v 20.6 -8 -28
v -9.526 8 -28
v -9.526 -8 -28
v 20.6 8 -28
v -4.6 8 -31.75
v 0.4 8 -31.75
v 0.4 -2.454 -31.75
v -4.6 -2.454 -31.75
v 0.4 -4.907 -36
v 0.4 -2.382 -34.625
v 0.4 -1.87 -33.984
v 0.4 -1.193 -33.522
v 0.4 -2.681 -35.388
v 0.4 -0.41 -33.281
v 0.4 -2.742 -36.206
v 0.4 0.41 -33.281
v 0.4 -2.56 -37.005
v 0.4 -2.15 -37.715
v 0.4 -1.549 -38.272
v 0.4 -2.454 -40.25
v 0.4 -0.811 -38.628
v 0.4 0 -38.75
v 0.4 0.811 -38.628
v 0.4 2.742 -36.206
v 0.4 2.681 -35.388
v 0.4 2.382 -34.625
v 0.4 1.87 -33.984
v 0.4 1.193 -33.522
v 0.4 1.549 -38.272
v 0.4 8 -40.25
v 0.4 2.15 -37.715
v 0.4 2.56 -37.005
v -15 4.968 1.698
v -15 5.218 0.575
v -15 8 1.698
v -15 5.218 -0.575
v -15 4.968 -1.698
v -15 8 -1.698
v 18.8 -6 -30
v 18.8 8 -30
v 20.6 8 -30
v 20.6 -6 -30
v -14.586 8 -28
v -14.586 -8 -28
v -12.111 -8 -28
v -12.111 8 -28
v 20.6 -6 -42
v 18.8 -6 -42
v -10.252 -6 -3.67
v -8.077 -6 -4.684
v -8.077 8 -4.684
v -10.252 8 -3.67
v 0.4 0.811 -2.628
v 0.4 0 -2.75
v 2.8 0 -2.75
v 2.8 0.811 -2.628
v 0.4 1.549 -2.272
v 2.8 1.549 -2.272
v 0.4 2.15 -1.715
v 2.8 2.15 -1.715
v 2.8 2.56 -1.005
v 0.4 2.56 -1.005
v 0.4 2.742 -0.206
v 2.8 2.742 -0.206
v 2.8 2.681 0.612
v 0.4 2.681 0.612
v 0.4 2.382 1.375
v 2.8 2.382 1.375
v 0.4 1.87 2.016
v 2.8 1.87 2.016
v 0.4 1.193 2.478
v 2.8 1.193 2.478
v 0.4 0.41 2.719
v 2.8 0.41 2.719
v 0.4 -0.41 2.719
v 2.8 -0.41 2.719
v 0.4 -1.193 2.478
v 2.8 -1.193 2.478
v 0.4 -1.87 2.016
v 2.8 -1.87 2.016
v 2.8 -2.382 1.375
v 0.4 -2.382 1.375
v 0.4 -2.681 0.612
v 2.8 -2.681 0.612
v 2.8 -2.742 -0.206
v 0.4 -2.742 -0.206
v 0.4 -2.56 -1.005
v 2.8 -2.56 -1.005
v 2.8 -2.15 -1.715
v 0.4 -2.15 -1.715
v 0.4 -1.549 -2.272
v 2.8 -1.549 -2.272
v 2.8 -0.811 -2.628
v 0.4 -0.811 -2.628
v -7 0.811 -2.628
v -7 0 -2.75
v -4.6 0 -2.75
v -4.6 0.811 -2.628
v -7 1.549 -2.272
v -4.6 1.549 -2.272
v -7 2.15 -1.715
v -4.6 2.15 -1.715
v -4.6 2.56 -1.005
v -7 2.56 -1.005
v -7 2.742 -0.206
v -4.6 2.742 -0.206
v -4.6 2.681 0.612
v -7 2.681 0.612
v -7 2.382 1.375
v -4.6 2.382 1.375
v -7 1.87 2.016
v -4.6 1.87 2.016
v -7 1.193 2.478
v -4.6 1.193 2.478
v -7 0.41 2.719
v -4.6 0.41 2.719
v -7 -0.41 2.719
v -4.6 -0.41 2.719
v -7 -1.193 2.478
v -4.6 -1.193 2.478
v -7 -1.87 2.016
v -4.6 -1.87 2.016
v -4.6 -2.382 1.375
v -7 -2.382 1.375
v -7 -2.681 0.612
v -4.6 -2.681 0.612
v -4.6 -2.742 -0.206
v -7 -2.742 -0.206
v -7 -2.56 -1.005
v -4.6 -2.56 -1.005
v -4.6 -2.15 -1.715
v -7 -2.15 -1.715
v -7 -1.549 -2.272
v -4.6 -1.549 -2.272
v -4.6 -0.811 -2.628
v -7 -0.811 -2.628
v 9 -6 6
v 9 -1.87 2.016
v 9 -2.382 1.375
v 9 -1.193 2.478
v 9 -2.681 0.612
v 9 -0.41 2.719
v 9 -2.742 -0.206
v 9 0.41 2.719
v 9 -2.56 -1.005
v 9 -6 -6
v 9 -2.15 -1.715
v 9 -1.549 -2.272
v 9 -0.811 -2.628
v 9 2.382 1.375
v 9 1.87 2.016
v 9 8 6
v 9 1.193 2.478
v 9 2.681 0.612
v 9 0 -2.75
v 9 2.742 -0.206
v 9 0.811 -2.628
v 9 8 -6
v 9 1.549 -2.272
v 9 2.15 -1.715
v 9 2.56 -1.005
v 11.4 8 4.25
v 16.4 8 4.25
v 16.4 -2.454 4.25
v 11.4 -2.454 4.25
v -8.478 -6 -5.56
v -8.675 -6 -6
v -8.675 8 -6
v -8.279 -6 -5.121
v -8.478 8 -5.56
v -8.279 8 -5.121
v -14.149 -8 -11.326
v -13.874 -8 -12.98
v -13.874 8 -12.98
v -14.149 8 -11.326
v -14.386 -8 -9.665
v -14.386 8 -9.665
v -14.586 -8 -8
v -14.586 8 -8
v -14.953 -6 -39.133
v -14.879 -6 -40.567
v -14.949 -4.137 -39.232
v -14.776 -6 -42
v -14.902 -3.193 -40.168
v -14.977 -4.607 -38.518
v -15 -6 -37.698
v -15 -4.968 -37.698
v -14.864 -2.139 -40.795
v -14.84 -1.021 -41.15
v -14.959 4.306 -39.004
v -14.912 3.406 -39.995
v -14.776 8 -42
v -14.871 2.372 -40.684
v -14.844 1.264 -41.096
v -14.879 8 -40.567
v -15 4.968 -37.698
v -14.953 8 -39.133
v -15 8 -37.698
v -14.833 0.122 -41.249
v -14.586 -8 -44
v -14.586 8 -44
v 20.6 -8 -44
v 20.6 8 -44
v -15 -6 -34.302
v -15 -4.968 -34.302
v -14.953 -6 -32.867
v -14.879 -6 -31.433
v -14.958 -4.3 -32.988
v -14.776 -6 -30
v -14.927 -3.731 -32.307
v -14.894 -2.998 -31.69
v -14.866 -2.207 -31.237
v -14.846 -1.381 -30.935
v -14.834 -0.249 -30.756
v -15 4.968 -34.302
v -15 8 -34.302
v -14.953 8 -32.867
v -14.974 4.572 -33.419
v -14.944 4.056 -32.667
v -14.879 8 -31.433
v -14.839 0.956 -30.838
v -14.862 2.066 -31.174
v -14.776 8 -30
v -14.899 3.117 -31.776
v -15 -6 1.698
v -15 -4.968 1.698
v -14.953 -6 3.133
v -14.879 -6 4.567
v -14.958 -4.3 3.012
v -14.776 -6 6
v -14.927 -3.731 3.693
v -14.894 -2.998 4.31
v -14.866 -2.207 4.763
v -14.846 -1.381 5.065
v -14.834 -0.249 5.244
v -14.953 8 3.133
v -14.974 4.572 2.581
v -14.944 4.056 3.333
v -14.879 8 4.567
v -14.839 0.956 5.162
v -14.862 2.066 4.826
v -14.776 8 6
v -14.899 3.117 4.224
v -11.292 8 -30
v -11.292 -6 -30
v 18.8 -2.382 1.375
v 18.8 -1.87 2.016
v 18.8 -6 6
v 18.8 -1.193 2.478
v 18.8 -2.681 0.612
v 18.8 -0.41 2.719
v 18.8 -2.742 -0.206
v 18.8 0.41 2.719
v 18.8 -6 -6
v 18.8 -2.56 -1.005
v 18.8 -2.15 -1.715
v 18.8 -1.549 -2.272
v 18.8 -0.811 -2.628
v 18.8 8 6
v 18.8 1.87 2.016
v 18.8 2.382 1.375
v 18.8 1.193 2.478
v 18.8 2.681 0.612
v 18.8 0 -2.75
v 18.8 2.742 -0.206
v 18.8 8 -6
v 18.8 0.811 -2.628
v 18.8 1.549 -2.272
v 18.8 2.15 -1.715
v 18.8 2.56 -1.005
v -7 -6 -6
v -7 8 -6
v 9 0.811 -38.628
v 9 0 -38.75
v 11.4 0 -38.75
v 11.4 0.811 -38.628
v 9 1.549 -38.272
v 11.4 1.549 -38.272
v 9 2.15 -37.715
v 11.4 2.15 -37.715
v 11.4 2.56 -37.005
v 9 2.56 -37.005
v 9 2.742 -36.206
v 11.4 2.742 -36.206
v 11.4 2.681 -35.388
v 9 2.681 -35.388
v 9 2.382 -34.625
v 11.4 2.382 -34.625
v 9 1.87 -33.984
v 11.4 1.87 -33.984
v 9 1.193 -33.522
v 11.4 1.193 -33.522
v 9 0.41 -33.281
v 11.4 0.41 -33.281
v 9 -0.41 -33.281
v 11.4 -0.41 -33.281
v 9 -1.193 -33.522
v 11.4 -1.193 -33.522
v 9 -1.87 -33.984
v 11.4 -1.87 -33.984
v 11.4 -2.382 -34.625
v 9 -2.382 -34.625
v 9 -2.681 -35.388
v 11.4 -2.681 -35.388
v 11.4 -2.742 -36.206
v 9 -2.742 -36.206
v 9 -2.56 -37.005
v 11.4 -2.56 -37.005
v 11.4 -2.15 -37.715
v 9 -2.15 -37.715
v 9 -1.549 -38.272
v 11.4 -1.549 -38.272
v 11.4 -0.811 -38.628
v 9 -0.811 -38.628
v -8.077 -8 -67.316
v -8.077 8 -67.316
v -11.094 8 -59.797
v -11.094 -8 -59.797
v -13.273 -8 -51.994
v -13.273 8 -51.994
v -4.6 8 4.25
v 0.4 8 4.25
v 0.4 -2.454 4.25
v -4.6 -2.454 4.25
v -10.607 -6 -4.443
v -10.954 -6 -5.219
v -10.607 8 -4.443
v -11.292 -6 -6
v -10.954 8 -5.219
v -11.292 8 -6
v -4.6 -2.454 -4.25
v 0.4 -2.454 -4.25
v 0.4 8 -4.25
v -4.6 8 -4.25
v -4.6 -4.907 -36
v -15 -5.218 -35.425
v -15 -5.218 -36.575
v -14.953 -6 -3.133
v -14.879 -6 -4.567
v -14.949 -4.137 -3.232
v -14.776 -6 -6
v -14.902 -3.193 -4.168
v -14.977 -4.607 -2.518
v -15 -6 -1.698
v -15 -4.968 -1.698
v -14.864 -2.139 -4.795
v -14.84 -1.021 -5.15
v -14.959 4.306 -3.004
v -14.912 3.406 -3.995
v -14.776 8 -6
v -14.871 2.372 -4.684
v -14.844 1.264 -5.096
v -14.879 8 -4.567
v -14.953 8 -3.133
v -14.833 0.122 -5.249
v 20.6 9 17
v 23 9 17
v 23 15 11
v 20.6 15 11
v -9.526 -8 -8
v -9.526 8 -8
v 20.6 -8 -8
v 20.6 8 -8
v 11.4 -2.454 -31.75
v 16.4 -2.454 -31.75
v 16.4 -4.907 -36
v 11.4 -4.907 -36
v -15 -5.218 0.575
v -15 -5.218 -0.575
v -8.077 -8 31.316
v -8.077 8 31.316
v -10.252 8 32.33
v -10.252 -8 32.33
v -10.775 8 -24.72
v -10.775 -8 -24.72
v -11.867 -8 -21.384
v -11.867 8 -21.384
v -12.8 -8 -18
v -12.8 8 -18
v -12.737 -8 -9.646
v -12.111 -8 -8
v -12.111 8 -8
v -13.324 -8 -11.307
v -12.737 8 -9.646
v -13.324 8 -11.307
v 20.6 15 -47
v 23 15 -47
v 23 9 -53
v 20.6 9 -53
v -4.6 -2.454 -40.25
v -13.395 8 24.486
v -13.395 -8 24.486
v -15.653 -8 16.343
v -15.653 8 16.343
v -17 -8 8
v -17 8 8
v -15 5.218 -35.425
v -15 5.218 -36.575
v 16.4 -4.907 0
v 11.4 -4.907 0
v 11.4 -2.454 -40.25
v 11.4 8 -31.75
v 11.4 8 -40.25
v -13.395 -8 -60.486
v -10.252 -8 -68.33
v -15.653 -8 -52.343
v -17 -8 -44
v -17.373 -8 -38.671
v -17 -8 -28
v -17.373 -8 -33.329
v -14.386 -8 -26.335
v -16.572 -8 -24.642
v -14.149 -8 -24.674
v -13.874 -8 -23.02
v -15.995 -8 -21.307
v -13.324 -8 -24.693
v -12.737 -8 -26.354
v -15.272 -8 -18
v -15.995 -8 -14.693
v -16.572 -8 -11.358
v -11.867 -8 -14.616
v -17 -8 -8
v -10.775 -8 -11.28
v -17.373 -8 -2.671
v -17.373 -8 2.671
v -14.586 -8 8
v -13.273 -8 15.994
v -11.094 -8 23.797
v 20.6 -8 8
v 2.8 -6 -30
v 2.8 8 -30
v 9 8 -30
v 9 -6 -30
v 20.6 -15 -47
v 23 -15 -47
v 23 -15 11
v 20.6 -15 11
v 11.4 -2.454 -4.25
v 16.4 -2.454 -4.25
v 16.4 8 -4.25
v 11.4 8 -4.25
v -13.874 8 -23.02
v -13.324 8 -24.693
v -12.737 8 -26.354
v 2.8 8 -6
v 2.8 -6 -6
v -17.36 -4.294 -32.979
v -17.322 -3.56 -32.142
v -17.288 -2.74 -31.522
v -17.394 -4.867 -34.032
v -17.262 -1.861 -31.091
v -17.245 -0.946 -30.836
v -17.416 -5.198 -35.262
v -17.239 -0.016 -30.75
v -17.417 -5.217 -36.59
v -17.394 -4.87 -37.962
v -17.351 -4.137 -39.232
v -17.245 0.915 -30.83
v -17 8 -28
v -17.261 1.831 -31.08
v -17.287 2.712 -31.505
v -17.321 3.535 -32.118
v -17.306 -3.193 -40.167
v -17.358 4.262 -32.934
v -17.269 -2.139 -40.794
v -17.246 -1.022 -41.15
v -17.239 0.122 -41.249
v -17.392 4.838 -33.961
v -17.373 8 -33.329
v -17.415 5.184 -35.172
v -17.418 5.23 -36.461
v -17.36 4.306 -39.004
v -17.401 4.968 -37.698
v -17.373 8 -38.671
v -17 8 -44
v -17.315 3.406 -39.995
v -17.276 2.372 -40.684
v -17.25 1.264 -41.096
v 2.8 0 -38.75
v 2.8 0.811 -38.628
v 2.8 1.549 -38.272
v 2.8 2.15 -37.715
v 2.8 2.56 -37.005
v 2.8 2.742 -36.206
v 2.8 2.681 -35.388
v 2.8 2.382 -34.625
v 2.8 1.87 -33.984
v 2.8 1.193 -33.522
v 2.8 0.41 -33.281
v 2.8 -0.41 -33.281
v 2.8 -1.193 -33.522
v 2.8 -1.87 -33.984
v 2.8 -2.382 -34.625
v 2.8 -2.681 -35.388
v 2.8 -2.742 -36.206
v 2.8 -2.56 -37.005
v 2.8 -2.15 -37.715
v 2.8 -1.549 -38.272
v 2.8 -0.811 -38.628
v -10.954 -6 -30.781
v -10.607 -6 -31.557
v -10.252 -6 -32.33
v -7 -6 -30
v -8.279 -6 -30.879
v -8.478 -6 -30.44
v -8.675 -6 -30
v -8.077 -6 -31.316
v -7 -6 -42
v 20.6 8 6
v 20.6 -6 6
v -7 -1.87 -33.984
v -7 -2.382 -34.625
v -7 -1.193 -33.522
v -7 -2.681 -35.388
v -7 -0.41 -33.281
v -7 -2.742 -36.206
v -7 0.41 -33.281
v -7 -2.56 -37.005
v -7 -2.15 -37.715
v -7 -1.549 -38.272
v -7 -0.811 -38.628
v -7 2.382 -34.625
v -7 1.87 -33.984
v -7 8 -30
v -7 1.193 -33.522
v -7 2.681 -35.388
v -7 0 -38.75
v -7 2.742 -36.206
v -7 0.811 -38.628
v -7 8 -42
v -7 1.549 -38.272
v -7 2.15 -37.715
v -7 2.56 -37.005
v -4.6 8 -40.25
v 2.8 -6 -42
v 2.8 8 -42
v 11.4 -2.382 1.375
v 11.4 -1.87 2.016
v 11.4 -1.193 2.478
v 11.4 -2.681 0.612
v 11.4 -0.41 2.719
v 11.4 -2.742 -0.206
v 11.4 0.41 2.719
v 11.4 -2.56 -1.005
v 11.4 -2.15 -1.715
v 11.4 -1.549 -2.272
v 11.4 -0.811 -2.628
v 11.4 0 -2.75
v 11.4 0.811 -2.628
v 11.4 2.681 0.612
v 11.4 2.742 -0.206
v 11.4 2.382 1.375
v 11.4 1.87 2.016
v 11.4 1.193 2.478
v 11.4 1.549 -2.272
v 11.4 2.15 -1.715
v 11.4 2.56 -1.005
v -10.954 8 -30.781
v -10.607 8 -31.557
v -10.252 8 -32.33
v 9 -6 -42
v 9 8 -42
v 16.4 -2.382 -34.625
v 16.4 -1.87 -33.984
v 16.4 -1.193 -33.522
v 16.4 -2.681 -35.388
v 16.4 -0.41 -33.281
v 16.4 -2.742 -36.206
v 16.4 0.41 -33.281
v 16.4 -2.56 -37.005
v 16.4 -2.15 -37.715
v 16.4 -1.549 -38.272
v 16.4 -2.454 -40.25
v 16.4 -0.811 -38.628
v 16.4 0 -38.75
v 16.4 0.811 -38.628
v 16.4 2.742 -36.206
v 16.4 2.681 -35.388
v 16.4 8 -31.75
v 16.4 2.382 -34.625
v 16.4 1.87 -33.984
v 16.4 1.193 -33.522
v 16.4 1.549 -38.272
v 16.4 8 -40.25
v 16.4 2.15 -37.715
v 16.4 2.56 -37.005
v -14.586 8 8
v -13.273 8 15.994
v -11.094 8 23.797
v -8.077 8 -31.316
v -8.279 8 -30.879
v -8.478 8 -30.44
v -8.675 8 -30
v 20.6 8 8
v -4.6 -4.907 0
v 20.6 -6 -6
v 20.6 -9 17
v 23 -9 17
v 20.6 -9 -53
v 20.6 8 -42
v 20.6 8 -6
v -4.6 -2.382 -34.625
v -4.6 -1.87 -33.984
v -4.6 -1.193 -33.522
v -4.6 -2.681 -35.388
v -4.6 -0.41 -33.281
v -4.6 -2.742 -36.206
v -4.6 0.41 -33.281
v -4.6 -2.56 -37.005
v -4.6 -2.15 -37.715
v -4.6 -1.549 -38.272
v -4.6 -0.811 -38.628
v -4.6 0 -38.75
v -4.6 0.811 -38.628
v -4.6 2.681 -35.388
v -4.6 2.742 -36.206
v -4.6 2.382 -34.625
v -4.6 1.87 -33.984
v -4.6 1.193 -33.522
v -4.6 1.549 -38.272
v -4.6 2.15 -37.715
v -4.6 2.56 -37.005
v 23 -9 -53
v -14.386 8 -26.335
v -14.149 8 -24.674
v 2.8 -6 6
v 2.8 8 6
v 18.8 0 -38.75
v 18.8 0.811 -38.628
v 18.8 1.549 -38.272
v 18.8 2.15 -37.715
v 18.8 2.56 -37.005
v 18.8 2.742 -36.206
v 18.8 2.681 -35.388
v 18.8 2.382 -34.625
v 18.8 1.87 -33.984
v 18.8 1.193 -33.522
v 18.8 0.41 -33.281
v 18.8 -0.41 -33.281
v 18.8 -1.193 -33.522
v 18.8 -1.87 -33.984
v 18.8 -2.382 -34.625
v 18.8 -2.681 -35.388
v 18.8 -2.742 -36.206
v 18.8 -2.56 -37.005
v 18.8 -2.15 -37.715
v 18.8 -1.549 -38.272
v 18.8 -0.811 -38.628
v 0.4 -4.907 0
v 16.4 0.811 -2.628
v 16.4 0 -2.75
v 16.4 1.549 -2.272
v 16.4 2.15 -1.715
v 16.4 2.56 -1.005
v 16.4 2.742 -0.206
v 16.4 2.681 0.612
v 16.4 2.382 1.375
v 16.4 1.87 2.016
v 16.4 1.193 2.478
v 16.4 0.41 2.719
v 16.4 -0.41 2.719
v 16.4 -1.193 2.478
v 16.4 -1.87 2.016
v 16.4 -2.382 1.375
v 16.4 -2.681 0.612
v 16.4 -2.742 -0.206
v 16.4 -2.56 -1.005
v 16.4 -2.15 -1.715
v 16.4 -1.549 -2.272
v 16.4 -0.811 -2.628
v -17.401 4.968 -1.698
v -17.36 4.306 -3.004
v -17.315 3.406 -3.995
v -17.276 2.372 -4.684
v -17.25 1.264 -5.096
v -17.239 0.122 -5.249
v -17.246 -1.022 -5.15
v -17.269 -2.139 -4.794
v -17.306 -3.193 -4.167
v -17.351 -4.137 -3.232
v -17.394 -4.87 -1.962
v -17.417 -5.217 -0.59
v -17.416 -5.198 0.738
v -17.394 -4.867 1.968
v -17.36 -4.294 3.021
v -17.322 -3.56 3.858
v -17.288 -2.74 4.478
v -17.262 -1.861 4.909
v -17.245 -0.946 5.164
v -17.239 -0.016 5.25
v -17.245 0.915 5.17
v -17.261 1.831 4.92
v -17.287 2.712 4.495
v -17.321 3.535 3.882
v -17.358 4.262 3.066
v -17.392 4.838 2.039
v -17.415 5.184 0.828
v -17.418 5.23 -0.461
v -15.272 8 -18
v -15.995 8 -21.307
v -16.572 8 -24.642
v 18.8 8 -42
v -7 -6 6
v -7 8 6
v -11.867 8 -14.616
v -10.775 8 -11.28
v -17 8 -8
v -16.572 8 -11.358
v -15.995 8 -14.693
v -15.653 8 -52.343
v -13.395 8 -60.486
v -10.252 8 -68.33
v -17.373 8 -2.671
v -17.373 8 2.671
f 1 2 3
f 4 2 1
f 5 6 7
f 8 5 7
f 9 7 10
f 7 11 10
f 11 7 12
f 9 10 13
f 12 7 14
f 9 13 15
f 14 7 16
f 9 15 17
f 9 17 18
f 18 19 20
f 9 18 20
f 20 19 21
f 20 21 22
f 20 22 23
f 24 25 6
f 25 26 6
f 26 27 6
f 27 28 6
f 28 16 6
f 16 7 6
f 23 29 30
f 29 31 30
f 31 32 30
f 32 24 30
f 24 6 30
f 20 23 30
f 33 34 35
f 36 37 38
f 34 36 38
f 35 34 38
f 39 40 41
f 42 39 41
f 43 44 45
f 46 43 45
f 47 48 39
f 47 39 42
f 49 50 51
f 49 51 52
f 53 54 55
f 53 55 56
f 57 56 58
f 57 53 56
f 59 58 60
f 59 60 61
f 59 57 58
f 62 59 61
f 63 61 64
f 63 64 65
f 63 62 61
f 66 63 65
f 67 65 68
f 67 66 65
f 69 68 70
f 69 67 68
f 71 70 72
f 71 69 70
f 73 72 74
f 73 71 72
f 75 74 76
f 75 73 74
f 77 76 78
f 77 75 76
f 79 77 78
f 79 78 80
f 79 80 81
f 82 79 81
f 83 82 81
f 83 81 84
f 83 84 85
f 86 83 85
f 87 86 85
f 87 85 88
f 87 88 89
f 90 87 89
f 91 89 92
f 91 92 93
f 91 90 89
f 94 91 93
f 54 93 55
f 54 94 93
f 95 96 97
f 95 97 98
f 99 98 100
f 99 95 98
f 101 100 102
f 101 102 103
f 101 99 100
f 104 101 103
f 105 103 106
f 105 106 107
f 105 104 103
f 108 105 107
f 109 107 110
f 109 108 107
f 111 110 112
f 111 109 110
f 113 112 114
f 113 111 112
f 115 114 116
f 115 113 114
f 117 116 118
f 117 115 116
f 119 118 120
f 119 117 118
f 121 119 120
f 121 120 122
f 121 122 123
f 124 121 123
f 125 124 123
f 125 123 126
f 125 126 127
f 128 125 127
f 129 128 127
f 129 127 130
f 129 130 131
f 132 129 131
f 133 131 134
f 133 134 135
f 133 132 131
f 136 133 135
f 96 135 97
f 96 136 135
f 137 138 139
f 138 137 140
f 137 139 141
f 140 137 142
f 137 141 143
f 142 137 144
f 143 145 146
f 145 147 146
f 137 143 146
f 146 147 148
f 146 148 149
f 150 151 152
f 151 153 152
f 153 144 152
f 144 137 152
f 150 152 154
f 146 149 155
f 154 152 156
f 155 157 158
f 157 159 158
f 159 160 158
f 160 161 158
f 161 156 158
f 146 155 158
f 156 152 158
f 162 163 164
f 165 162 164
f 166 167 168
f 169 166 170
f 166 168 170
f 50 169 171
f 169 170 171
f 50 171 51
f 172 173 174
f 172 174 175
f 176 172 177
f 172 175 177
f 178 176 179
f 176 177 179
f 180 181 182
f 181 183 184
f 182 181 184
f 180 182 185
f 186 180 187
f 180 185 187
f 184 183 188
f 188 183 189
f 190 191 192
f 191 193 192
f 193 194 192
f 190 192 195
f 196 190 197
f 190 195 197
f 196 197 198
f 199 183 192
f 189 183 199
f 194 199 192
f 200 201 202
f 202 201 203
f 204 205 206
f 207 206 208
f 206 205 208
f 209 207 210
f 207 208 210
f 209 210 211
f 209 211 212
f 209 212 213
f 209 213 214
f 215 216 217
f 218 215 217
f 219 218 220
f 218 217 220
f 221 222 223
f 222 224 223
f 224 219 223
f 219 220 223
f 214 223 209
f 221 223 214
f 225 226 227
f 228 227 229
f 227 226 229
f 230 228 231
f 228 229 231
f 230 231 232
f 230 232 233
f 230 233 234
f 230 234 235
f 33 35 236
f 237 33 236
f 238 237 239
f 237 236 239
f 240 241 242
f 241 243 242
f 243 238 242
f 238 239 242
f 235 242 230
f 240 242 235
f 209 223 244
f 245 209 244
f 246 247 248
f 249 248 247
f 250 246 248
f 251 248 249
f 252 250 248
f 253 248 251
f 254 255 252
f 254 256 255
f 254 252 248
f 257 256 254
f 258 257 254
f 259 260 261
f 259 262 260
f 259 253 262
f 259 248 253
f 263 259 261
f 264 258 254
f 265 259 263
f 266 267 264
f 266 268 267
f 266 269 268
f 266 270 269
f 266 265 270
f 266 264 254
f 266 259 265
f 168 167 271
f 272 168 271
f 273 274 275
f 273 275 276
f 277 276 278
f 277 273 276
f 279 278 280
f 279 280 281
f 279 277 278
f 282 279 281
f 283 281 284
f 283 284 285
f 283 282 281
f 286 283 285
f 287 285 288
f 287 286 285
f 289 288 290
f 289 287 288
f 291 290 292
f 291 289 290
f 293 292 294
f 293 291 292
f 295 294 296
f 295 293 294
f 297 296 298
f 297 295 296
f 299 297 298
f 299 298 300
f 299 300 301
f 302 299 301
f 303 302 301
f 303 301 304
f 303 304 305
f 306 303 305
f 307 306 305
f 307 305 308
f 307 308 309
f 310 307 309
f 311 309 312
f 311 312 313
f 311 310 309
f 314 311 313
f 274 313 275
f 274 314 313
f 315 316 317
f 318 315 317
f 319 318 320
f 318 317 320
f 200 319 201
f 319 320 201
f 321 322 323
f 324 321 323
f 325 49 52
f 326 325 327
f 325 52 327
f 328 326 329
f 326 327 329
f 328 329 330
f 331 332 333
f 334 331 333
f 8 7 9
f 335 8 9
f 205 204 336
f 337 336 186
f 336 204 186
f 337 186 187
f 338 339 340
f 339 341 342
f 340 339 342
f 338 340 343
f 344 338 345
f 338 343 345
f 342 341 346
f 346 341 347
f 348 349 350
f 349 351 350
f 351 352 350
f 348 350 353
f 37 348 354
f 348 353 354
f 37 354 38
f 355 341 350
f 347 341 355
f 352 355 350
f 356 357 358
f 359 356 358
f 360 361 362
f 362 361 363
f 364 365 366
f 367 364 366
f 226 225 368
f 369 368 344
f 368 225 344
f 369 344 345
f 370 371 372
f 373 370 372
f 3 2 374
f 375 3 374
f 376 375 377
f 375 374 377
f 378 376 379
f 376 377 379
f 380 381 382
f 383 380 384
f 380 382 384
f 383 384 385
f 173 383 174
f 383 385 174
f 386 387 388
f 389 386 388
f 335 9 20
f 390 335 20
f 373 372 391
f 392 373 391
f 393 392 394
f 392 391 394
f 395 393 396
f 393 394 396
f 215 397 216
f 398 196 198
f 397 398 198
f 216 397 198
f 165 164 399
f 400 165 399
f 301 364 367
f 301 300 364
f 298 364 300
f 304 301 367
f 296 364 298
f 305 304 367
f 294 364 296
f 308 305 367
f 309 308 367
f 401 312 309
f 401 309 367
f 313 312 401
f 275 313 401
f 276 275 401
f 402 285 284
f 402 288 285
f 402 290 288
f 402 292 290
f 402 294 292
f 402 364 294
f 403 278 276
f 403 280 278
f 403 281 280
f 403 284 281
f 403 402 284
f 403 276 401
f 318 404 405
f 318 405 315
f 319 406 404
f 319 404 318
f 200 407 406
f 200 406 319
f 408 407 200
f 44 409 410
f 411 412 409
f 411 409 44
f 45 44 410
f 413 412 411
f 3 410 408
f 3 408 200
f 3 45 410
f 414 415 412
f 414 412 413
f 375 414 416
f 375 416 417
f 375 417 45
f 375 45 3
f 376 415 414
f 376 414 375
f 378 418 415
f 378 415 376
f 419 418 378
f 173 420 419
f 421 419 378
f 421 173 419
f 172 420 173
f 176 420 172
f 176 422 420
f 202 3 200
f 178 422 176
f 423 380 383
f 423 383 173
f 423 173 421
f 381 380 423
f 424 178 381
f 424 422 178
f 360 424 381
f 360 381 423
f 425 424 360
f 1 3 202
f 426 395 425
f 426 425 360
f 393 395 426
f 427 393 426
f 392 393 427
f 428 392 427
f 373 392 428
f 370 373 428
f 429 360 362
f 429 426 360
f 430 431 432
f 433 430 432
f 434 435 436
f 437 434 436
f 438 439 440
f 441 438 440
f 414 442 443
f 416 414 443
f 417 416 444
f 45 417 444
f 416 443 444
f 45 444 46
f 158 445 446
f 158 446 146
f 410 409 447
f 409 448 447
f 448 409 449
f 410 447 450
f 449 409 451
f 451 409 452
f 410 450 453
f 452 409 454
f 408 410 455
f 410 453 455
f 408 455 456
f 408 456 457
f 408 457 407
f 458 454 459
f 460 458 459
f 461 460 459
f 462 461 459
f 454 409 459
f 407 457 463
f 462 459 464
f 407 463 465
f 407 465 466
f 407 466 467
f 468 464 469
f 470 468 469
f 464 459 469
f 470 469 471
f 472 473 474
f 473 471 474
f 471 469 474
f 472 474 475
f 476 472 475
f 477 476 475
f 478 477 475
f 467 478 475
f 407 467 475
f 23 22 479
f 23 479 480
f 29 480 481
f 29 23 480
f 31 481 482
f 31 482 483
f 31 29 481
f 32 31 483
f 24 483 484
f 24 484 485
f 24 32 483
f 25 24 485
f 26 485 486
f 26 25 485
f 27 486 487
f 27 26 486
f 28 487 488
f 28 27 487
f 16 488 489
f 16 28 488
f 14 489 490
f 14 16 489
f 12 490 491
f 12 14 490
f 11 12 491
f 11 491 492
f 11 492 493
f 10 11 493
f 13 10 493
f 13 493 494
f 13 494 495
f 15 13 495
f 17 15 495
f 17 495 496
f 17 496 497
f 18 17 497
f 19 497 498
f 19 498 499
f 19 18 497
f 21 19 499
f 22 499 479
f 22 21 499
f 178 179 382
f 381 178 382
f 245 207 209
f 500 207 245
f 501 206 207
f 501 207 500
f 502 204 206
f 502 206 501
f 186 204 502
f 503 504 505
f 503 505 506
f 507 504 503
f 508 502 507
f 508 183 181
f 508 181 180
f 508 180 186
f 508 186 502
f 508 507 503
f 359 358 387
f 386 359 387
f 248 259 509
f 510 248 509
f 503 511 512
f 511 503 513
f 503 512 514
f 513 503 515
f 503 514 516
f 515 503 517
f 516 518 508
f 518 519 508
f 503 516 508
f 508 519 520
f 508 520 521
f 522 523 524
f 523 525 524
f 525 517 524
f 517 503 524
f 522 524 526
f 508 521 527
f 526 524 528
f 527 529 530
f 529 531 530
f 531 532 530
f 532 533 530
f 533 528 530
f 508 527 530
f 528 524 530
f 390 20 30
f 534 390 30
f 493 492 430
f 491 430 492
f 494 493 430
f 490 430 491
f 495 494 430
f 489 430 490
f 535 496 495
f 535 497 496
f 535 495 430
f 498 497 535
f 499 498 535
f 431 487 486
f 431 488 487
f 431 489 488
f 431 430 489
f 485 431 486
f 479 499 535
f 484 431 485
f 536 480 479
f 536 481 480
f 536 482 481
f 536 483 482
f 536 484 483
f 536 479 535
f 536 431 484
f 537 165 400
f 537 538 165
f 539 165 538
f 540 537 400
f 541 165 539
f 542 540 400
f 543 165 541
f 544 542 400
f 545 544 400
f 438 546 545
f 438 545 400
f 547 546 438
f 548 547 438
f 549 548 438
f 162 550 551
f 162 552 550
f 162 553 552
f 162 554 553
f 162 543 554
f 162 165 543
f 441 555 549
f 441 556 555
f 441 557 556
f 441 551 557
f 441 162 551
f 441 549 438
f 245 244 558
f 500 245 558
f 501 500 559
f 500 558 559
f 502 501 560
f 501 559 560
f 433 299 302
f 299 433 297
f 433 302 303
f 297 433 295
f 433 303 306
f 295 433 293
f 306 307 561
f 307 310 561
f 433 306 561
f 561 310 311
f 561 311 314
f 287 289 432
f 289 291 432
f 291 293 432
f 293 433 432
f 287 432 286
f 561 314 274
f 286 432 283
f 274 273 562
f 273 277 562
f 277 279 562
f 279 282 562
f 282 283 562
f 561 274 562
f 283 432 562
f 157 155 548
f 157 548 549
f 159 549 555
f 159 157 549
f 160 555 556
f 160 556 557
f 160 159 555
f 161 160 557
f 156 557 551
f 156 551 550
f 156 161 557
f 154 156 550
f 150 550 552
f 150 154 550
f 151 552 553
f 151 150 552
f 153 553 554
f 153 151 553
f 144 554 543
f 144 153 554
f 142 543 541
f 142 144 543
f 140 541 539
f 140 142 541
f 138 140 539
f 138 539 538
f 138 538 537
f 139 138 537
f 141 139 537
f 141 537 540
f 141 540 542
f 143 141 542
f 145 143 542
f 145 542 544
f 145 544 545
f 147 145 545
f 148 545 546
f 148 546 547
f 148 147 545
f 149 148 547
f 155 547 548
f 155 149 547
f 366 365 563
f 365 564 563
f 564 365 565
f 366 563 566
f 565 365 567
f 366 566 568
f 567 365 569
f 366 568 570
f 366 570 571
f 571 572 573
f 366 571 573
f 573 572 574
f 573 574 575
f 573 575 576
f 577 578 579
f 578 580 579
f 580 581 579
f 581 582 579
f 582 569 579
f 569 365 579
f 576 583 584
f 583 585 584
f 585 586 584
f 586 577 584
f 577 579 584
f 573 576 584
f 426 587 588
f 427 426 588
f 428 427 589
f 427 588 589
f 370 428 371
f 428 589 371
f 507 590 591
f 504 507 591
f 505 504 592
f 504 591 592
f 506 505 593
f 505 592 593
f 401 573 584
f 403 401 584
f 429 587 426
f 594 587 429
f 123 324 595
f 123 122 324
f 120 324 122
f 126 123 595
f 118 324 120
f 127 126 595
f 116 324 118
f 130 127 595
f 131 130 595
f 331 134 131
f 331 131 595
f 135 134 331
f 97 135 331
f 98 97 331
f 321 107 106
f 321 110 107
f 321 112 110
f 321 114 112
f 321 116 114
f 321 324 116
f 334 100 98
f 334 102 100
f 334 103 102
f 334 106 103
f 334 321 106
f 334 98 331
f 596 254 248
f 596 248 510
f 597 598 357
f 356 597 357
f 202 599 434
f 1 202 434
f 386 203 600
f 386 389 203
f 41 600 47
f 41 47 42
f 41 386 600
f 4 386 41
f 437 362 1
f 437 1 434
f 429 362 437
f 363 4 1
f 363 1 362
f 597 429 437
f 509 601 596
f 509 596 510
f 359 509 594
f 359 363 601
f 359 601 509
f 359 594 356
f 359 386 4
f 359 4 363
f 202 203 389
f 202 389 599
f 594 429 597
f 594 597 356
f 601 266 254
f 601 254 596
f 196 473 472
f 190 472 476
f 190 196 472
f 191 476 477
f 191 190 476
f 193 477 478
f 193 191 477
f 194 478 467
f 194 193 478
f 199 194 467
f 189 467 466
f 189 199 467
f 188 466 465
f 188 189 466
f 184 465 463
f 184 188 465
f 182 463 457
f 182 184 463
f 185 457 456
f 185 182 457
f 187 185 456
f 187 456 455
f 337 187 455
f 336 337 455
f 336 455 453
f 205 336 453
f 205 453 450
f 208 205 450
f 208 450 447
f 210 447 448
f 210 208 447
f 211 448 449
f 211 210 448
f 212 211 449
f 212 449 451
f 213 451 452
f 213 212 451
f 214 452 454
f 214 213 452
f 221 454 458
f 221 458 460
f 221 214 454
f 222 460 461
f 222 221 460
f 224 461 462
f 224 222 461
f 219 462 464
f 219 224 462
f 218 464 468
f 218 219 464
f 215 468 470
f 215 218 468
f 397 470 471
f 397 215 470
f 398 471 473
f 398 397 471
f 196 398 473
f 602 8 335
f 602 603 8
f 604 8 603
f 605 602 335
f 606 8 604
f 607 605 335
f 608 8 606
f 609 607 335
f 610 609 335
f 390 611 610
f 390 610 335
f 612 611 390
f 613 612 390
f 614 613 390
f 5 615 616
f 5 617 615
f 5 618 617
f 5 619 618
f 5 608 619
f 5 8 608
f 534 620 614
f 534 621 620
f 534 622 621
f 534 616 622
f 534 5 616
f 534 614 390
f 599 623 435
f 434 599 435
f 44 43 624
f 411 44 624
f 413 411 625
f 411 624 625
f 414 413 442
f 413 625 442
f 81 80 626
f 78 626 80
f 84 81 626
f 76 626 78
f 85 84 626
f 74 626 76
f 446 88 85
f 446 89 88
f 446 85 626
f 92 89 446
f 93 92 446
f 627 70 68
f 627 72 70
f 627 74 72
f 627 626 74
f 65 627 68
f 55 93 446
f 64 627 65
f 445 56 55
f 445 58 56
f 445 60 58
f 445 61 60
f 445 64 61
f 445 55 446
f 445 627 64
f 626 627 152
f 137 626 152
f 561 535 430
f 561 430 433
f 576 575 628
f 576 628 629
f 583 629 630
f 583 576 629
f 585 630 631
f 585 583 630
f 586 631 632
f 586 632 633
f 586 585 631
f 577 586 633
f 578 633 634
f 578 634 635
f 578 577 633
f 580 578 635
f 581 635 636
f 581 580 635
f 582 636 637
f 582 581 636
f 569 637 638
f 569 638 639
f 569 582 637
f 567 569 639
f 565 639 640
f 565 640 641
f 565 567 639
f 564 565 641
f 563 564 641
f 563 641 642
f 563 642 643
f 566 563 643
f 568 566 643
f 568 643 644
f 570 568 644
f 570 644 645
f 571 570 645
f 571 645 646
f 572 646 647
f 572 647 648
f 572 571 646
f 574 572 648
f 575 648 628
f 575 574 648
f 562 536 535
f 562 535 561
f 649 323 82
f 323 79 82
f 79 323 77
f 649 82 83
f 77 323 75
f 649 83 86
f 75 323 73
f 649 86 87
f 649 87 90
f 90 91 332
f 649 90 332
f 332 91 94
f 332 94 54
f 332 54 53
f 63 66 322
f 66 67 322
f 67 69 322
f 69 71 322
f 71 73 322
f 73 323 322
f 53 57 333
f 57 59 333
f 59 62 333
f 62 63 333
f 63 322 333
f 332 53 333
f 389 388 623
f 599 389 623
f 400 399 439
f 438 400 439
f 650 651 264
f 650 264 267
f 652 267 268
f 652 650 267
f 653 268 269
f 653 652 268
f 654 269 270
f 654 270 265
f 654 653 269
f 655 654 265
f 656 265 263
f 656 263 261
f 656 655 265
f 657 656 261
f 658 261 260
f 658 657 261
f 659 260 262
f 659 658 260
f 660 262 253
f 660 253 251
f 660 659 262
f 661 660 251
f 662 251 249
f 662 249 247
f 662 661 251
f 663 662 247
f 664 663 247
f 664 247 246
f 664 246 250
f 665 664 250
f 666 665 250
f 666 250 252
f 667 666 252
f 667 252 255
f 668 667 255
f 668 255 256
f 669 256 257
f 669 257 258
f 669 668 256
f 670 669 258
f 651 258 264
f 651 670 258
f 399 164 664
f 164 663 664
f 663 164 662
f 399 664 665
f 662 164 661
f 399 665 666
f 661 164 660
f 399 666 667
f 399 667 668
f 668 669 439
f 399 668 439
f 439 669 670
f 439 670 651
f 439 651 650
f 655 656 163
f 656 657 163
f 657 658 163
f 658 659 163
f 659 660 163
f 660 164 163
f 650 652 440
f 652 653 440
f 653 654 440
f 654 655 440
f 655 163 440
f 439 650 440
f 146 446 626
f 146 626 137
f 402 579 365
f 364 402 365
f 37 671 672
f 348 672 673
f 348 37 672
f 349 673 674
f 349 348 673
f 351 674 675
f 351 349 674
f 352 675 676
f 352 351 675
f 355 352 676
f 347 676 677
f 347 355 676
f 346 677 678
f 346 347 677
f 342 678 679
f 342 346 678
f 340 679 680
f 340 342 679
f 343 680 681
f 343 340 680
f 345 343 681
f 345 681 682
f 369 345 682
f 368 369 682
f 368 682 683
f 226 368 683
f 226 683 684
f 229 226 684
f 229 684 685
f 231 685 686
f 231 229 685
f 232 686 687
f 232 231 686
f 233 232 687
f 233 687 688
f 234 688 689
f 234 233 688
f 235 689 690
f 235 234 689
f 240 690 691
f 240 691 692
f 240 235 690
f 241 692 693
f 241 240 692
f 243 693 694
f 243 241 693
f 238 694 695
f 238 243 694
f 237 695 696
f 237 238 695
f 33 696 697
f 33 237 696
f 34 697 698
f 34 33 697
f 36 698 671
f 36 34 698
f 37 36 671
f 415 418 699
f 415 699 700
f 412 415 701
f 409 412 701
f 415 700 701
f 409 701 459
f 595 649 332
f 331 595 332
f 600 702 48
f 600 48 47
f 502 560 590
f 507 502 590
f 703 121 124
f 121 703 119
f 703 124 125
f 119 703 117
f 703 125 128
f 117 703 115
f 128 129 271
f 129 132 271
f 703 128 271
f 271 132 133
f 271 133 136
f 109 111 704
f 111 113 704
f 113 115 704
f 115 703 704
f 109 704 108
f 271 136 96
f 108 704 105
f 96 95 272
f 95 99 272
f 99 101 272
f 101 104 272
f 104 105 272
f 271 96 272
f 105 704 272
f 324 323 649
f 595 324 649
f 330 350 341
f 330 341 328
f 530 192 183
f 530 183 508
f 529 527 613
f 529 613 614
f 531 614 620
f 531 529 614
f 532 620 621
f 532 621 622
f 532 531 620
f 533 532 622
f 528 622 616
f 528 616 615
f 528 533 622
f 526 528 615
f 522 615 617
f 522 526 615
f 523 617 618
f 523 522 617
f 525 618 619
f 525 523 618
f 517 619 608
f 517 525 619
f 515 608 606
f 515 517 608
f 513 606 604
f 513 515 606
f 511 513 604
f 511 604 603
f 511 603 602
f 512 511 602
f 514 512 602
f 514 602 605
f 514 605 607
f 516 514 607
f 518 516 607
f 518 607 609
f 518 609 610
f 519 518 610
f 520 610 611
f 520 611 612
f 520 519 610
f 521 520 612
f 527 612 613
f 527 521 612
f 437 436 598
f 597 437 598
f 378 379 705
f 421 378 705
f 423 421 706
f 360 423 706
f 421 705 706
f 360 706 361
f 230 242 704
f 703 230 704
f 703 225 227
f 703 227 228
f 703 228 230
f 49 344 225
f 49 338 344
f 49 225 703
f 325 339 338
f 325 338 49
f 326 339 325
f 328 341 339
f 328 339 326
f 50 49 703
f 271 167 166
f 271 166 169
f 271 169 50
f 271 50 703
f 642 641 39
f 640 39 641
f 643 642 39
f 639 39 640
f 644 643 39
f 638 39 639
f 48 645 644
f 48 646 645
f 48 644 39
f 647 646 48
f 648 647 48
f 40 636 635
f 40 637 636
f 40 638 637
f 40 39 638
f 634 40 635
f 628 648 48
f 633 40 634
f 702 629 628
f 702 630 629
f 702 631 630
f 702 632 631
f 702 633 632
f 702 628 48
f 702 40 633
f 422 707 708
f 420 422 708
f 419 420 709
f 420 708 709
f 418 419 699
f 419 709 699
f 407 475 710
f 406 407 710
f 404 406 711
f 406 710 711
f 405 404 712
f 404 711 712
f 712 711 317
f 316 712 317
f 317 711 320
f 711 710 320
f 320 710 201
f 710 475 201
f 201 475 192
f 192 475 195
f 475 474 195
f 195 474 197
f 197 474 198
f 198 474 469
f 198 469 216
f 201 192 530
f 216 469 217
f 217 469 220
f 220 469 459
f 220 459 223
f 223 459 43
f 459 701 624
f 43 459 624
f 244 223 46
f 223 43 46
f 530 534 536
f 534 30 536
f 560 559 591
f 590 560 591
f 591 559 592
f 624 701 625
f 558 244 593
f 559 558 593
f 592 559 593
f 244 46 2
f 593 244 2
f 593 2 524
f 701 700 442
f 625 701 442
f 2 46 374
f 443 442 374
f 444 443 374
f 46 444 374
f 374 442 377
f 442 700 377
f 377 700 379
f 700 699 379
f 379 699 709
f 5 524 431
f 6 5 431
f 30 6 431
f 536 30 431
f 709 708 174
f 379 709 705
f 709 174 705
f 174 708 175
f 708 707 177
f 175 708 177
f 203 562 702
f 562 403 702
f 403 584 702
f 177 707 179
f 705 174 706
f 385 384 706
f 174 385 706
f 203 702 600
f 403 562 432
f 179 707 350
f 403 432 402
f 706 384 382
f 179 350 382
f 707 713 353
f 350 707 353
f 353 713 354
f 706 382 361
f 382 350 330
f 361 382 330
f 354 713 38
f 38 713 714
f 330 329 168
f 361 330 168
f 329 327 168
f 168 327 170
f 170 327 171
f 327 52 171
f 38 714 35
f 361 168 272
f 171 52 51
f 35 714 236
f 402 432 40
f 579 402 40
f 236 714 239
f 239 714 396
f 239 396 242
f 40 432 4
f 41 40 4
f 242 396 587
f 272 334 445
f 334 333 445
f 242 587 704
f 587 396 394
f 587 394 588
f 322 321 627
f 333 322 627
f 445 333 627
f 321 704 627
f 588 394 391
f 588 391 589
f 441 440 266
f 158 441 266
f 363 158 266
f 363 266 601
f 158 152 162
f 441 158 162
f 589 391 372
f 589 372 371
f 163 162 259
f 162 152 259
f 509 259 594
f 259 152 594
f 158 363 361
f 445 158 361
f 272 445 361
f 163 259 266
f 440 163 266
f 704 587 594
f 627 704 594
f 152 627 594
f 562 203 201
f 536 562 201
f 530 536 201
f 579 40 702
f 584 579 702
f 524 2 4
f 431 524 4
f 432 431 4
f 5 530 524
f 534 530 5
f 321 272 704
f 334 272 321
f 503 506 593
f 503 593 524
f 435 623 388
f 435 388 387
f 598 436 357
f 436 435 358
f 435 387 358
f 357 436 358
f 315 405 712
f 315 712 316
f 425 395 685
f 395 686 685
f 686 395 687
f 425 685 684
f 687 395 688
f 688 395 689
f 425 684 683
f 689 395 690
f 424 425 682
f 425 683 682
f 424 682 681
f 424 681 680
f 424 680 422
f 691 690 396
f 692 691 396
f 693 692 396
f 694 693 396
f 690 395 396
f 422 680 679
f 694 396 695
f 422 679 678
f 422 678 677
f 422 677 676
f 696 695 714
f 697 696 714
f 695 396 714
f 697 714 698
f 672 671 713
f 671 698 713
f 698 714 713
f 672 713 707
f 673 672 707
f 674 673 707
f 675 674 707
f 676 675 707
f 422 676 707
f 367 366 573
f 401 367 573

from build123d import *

# Parameters (mm, degrees)
BOSS_EXTRUDE1_DEPTH       = 8
BOSS_EXTRUDE1_DEPTH_BACK  = 8
SKETCH1_W                 = 40
SKETCH1_H                 = 16
SHELL1_T                  = -2
SKETCH3_R                 = 4.470610275
CUT_EXTRUDE1_DEPTH        = 10
SKETCH4_W                 = 12
SKETCH4_H                 = 14
SKETCH4_R                 = 2.75
BOSS_EXTRUDE2_DEPTH       = 2.4
LPATTERN1_COUNT           = 2
LPATTERN1_PITCH           = 7.4
LPATTERN2_COUNT           = 2
LPATTERN2_PITCH           = 16
LPATTERN2_COPY_1_SKETCH_W = 12
LPATTERN2_COPY_1_SKETCH_H = 14
LPATTERN2_COPY_1_SKETCH_R = 2.75
LPATTERN2_COPY_1_DEPTH    = 2.4
BOSS_EXTRUDE4_DEPTH       = 5
LPATTERN3_COUNT           = 2
LPATTERN3_PITCH           = 16
BOSS_EXTRUDE6_START       = -16
BOSS_EXTRUDE6_DEPTH       = 16
SKETCH12_R                = 5.25
CUT_EXTRUDE3_DEPTH        = 45.824637279
LPATTERN4_COUNT           = 2
LPATTERN4_PITCH           = 36
BOSS_EXTRUDE5_DEPTH       = 2.4


with BuildPart() as part:
    # Sketch1 → Boss-Extrude1 (new, two sides: drawn at the far end of the back side and taken through both)
    with BuildSketch(Plane.XY.offset(-BOSS_EXTRUDE1_DEPTH_BACK)):
        with Locations((3, 0)):
            Rectangle(SKETCH1_W, SKETCH1_H)
    extrude(amount=BOSS_EXTRUDE1_DEPTH + BOSS_EXTRUDE1_DEPTH_BACK)

    # Shell1
    shell1_openings = [part.faces().sort_by_distance(p)[0] for p in [
        (3, 8, 0),
    ]]
    offset(amount=SHELL1_T, openings=shell1_openings, kind=Kind.INTERSECTION)

    # Sketch3 → Cut-Extrude1 (cut)
    with BuildSketch(Plane.ZY.offset(17)):
        Circle(SKETCH3_R)
    extrude(amount=-CUT_EXTRUDE1_DEPTH, mode=Mode.SUBTRACT)

    # Sketch4 → Boss-Extrude2 (add)
    with BuildSketch(Plane(origin=(-7, 0, 0), x_dir=(0, 0, -1), z_dir=(1, 0, 0))):
        with Locations((0, 1)):
            Rectangle(SKETCH4_W, SKETCH4_H)
        Circle(SKETCH4_R, mode=Mode.SUBTRACT)
    boss_extrude2 = extrude(amount=BOSS_EXTRUDE2_DEPTH)

    # LPattern1: Boss-Extrude2 ×2
    with Locations(*[(i * LPATTERN1_PITCH, 0, 0) for i in range(1, LPATTERN1_COUNT)]):
        add(boss_extrude2)

    # LPattern2: Boss-Extrude2 ×2
    with Locations(*[(i * LPATTERN2_PITCH, 0, 0) for i in range(1, LPATTERN2_COUNT)]):
        add(boss_extrude2)

    # LPattern2 copy 1 sketch → LPattern2 copy 1 (add)
    with BuildSketch(Plane(origin=(16.4, 0, 0), x_dir=(0, 0, -1), z_dir=(1, 0, 0))):
        with Locations((0, 1)):
            Rectangle(LPATTERN2_COPY_1_SKETCH_W, LPATTERN2_COPY_1_SKETCH_H)
        Circle(LPATTERN2_COPY_1_SKETCH_R, mode=Mode.SUBTRACT)
    extrude(amount=LPATTERN2_COPY_1_DEPTH)

    # Sketch6 → Boss-Extrude4 (add)
    with BuildSketch(Plane.ZY.offset(-16.4)):
        Polygon((-4.25, 2.453738644), (-4.25, 8), (-6, 8), (-6, -6), (6, -6), (6, 8), (4.25, 8), (4.25, 2.453738644), (4.25, -2.453738644), (0, -4.907477288), (-4.25, -2.453738644), align=None)
    boss_extrude4 = extrude(amount=BOSS_EXTRUDE4_DEPTH)

    # LPattern3: Boss-Extrude4 ×2
    with Locations(*[(-i * LPATTERN3_PITCH, 0, 0) for i in range(1, LPATTERN3_COUNT)]):
        add(boss_extrude4)

    # Sketch11 → Boss-Extrude6 (add)
    with BuildSketch(Plane.XZ.offset(8).offset(BOSS_EXTRUDE6_START)):
        with BuildLine():
            ThreePointArc((-10.251996289, 32.330297023), (-14.636700237, 20.445466564), (-17, 8))
            Line((-17, 8), (-14.58633595, 8))
            ThreePointArc((-14.58633595, 8), (-12.290169012, 19.925625473), (-8.0768576, 31.316013195))
            Line((-8.0768576, 31.316013195), (-10.251996289, 32.330297023))
        make_face()
        with BuildLine():
            ThreePointArc((-17, 8), (-17.41945058, 0), (-17, -8))
            Line((-17, -8), (-17, 8))
        make_face()
        with BuildLine():
            Line((-17, 8), (-17, -8))
            Line((-17, -8), (-14.58633595, -8))
            ThreePointArc((-14.58633595, -8), (-15.01945058, 0), (-14.58633595, 8))
            Line((-14.58633595, 8), (-17, 8))
        make_face()
        with BuildLine():
            ThreePointArc((-17, -8), (-14.636700237, -20.445466564), (-10.251996289, -32.330297023))
            Line((-10.251996289, -32.330297023), (-8.0768576, -31.316013195))
            ThreePointArc((-8.0768576, -31.316013195), (-12.290169012, -19.925625473), (-14.58633595, -8))
            Line((-14.58633595, -8), (-17, -8))
        make_face()
    extrude(amount=BOSS_EXTRUDE6_DEPTH)

    # Sketch12 → Cut-Extrude3 (cut, through all)
    with BuildSketch(Plane.ZY.offset(7)):
        with Locations(Location((0, 0, 0), (0, 0, 108.866979722))):
            Circle(SKETCH12_R)
    extrude(amount=CUT_EXTRUDE3_DEPTH, mode=Mode.SUBTRACT)


with BuildPart() as lpattern4_1:
    # LPattern4: pattern copy
    add(part.part.moved(Location(Vector(0, 0, -1) * (1 * LPATTERN4_PITCH))))


with BuildPart() as part_1:
    add(part.part)

    add(lpattern4_1.part)  # Boss-Extrude5 merges LPattern4_1
    # Sketch8 → Boss-Extrude5 (add)
    with BuildSketch(Plane(origin=(23, 0, 0), x_dir=(0, 0, -1), z_dir=(1, 0, 0))):
        Polygon((47, -15), (-11, -15), (-17, -9), (-17, 9), (-11, 15), (47, 15), (53, 9), (53, -9), align=None)
    extrude(amount=-BOSS_EXTRUDE5_DEPTH)


solid = part_1.part
